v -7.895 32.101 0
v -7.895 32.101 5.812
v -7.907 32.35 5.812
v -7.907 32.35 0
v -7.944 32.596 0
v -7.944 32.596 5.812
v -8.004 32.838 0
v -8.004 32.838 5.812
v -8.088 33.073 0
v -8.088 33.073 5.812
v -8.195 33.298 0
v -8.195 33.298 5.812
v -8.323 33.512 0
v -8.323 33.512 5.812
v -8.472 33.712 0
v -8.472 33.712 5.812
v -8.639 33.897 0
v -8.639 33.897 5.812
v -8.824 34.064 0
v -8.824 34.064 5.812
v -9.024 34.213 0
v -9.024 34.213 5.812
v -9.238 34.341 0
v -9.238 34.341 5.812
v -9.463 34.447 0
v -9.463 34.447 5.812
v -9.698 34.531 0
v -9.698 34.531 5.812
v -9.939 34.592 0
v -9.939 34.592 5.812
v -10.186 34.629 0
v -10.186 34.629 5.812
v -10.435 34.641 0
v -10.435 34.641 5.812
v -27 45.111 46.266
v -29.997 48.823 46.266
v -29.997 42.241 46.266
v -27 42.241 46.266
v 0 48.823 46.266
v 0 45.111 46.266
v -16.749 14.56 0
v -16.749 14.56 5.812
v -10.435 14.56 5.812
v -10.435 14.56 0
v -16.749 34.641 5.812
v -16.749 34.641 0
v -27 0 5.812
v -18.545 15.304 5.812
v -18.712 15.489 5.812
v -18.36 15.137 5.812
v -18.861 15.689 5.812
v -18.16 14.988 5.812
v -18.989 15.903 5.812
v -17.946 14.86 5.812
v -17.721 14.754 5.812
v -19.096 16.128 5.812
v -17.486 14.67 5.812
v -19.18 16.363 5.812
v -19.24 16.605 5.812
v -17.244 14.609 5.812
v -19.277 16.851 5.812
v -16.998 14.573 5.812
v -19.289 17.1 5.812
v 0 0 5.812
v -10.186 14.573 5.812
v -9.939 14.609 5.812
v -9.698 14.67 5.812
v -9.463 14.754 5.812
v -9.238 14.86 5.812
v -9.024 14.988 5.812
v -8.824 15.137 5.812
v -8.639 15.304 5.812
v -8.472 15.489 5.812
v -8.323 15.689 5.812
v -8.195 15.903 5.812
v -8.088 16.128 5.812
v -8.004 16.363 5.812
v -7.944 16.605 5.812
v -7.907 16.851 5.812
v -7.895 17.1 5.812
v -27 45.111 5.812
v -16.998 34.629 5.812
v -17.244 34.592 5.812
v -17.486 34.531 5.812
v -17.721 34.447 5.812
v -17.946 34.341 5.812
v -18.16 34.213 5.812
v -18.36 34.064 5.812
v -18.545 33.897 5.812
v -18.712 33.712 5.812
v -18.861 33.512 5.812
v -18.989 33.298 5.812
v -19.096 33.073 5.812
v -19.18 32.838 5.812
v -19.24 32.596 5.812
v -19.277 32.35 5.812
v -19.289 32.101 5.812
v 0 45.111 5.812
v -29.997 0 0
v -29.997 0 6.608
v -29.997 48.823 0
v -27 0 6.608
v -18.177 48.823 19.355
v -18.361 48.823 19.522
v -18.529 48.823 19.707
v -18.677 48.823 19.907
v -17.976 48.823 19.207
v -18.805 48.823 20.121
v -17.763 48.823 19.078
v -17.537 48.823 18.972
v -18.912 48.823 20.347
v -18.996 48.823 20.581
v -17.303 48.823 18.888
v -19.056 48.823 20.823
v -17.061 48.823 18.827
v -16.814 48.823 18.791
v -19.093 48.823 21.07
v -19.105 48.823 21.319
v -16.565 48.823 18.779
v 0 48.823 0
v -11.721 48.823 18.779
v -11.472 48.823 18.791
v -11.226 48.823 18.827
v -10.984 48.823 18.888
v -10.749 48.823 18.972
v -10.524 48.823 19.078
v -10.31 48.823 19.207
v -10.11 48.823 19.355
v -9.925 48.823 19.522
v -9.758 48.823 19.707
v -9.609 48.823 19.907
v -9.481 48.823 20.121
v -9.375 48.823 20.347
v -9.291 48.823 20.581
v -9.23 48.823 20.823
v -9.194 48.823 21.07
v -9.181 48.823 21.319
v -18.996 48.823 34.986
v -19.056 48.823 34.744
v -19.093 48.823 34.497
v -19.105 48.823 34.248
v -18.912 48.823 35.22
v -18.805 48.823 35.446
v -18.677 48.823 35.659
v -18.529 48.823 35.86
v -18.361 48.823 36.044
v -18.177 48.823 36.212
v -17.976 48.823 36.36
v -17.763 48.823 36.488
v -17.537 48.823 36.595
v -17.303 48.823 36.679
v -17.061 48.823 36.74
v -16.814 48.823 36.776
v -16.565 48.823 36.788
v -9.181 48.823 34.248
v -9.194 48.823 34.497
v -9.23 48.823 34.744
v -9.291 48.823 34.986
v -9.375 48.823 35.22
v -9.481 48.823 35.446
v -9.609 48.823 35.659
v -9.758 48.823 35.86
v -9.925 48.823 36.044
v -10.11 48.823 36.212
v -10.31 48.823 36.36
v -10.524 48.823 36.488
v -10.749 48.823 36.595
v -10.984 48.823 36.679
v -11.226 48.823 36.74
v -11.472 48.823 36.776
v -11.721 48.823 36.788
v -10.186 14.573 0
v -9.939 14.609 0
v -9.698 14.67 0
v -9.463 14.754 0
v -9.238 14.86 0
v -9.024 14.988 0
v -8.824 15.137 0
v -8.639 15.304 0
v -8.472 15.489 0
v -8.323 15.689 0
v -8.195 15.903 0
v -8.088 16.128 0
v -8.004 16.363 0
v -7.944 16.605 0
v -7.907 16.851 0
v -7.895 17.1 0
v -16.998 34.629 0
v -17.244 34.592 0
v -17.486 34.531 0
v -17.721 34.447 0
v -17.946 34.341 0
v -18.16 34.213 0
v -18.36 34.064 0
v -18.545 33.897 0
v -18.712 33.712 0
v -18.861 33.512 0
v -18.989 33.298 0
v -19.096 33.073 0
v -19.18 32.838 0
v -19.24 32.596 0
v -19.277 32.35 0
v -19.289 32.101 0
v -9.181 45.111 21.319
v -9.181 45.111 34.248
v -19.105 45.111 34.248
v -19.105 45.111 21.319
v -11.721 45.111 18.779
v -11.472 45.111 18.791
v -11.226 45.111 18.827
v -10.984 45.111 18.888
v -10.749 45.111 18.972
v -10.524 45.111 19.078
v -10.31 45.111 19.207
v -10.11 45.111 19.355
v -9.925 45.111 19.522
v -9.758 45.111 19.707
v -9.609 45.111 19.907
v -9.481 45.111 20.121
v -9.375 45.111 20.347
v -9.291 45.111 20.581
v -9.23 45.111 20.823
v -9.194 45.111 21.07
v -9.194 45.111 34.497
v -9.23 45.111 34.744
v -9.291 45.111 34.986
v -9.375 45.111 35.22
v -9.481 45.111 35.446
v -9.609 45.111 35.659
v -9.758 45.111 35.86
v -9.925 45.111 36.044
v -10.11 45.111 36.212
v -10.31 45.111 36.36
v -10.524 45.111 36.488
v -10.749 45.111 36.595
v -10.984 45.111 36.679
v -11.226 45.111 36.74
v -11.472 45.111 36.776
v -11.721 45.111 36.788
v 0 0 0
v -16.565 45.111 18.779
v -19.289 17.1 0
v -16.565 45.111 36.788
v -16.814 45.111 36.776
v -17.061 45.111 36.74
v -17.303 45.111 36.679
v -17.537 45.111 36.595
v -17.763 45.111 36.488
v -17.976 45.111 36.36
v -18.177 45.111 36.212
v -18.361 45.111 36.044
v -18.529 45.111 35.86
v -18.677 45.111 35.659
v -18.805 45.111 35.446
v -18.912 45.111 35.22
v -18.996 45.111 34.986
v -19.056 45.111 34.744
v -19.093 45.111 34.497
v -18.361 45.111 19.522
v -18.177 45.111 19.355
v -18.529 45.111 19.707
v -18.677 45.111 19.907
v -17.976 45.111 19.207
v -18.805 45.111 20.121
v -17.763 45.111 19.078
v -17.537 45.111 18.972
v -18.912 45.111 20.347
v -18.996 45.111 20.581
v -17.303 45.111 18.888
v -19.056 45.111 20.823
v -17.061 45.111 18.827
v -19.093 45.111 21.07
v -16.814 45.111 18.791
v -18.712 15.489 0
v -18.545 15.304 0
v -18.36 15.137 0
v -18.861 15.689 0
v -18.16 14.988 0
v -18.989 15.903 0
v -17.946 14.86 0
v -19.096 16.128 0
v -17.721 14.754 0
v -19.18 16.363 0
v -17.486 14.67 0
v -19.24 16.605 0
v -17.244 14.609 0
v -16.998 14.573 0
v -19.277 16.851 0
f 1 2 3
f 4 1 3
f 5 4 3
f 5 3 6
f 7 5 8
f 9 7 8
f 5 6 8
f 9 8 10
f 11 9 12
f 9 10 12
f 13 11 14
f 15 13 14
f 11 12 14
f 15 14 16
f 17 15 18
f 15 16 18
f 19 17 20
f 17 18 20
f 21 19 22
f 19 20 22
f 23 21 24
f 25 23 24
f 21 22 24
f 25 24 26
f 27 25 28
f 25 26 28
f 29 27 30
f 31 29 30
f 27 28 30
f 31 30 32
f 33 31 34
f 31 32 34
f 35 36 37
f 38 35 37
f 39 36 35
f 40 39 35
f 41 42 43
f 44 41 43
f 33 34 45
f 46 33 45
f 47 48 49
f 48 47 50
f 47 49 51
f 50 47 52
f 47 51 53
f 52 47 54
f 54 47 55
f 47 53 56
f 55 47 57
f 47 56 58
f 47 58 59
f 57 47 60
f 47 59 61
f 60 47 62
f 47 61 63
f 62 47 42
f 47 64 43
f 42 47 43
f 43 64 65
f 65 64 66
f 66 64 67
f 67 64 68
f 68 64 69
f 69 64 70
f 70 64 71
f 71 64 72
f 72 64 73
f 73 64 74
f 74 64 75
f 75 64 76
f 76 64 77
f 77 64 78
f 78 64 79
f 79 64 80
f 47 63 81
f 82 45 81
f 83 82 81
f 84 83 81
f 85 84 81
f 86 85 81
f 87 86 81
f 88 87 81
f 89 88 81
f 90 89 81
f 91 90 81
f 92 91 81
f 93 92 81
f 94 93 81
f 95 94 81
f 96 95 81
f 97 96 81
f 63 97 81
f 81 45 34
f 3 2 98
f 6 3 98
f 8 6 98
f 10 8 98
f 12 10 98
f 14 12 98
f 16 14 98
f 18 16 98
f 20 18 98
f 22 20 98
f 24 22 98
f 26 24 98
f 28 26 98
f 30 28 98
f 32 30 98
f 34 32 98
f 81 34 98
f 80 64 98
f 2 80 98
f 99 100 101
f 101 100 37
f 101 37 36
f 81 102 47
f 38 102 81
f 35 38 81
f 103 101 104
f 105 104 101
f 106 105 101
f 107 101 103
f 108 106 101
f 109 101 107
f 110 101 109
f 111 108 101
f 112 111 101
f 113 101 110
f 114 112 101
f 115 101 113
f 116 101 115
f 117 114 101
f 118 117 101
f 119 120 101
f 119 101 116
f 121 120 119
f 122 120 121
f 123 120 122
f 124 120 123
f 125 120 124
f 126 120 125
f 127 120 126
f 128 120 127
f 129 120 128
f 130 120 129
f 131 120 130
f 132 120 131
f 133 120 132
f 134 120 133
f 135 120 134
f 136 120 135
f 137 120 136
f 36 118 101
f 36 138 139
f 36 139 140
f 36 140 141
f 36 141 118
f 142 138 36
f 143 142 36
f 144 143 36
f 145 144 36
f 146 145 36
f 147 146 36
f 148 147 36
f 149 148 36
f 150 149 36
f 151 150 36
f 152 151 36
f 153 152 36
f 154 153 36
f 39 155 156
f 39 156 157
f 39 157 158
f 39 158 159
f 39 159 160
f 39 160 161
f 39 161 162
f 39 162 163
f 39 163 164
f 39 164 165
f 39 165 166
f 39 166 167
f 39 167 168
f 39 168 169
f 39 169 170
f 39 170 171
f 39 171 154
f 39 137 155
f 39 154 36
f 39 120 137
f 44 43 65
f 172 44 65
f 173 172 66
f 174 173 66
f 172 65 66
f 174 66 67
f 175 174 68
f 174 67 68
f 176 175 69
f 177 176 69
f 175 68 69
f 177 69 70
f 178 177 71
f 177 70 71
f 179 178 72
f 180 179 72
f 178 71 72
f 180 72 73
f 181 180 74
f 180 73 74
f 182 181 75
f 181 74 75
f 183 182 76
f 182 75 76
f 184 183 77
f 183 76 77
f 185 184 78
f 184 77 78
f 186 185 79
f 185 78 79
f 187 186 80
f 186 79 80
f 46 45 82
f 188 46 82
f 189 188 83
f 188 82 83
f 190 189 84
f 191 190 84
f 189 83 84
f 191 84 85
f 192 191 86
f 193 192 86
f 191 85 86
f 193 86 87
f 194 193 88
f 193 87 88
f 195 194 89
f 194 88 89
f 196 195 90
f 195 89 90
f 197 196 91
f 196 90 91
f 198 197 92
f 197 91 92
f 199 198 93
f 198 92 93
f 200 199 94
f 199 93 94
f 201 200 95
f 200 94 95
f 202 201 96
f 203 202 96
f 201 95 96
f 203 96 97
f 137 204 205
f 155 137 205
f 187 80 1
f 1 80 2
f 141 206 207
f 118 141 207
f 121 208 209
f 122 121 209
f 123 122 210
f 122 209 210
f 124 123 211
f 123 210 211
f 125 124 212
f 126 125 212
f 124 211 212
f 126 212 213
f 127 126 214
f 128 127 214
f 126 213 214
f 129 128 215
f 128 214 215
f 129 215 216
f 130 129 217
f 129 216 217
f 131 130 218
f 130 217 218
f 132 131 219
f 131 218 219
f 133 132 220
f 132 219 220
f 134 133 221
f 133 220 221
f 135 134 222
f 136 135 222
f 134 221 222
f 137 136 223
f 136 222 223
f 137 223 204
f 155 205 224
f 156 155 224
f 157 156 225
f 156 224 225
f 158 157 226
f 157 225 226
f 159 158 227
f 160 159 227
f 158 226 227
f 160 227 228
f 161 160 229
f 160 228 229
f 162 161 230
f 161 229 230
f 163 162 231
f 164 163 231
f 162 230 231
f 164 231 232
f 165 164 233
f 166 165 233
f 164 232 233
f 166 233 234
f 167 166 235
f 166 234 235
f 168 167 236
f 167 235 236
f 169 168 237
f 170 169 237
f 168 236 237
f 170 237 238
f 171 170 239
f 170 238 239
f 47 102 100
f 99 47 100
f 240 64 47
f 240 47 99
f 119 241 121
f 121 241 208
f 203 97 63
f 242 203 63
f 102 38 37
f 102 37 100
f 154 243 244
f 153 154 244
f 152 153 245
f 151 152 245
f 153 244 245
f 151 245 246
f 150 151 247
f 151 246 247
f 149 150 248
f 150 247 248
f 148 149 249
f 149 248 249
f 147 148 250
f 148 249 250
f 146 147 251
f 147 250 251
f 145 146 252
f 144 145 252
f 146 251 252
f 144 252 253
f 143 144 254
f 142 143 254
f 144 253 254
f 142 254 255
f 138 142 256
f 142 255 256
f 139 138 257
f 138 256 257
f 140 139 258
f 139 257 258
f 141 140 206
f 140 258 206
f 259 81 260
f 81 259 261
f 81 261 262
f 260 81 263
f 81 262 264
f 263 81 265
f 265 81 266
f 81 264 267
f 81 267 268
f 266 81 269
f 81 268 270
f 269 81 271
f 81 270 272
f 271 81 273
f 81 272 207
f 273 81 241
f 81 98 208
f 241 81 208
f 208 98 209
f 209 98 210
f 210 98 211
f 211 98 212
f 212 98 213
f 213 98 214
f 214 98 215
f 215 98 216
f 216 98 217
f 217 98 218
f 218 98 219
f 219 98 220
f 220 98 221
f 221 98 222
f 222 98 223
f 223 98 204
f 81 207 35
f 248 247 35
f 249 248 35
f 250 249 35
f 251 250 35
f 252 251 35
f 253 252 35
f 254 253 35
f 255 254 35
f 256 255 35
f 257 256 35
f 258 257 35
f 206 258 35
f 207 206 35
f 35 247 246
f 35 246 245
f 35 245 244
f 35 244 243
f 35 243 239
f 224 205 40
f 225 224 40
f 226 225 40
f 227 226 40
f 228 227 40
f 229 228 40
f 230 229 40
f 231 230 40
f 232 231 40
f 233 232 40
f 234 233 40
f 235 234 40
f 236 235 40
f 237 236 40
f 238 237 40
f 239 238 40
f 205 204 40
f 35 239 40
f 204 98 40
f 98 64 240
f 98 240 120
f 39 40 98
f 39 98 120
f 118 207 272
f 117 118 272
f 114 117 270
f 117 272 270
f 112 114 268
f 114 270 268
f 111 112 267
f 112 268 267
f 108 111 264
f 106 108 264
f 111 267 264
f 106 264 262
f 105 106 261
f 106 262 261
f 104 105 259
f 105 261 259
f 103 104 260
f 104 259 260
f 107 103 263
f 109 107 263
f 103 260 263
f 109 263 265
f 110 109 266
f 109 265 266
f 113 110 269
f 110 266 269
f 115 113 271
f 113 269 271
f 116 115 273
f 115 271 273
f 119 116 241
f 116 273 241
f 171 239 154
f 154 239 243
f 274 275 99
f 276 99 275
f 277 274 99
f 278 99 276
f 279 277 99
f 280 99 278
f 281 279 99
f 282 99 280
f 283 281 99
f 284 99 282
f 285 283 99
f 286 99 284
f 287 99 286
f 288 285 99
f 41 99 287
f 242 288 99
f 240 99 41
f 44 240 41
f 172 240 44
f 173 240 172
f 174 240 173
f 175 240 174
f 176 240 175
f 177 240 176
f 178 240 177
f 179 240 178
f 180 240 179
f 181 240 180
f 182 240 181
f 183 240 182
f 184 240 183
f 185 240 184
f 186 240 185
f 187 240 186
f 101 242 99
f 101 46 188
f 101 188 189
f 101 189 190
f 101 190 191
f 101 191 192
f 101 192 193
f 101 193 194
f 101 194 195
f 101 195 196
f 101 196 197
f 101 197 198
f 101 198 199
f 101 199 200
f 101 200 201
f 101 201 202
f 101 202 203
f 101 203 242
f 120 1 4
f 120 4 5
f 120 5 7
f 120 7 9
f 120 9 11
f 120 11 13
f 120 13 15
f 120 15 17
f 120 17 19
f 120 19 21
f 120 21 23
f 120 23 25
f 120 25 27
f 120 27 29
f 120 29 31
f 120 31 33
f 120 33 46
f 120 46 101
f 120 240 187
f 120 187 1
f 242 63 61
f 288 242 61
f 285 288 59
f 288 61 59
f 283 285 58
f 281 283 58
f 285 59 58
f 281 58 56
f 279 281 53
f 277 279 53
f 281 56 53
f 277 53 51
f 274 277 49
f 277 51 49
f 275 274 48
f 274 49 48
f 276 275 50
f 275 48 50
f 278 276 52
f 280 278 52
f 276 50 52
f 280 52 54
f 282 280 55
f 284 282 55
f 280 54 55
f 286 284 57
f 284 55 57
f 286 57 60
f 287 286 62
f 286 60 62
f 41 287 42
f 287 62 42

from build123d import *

# Parameters (mm, degrees)
F1_DEPTH = 29.9974
F3_DEPTH = 27.0002
F6_DEPTH = 5.811617
F8_DEPTH = 3.712296


with BuildPart() as f1:
    # F0 (on Right) → F1 (new body)
    with BuildSketch(Plane.YZ):
        Polygon((0, 6.607804), (0, 0), (48.823252, 0), (48.823252, 46.265662), (42.241033, 46.265662), align=None)
    extrude(amount=-F1_DEPTH)


with BuildPart() as f3:
    # F2 (on Right) → F3 (new body)
    with BuildSketch(Plane.YZ):
        Polygon((45.110956, 5.811617), (45.110956, 61.896294), (-13.766318, 5.811617), align=None)
    extrude(amount=-F3_DEPTH)


with BuildPart() as f1_1:
    add(f1.part)

    # F4: cut F3
    add(f3.part, mode=Mode.SUBTRACT)

    # F5 (on face) → F6 (cut, through all)
    with BuildSketch(Plane.XY.offset(5.811617)):
        with BuildLine():
            Line((-10.435018, 34.640817), (-16.748959, 34.640817))
            ThreePointArc((-16.748959, 34.640817), (-18.54501, 33.896868), (-19.288959, 32.100817))
            Line((-19.288959, 32.100817), (-19.288959, 17.100303))
            ThreePointArc((-19.288959, 17.100303), (-18.54501, 15.304251), (-16.748959, 14.560303))
            Line((-16.748959, 14.560303), (-10.435018, 14.560303))
            ThreePointArc((-10.435018, 14.560303), (-8.638967, 15.304251), (-7.895018, 17.100303))
            Line((-7.895018, 17.100303), (-7.895018, 32.100817))
            ThreePointArc((-7.895018, 32.100817), (-8.638967, 33.896868), (-10.435018, 34.640817))
        make_face()
    extrude(amount=-F6_DEPTH, mode=Mode.SUBTRACT)

    # F7 (on face) → F8 (cut, through all)
    with BuildSketch(Plane.XZ.offset(-45.110956)):
        with BuildLine():
            Line((-11.721431, 36.788322), (-16.565181, 36.788322))
            ThreePointArc((-16.565181, 36.788322), (-18.361232, 36.044373), (-19.105181, 34.248322))
            Line((-19.105181, 34.248322), (-19.105181, 21.318551))
            ThreePointArc((-19.105181, 21.318551), (-18.361232, 19.5225), (-16.565181, 18.778551))
            Line((-16.565181, 18.778551), (-11.721431, 18.778551))
            ThreePointArc((-11.721431, 18.778551), (-9.925379, 19.5225), (-9.181431, 21.318551))
            Line((-9.181431, 21.318551), (-9.181431, 34.248322))
            ThreePointArc((-9.181431, 34.248322), (-9.925379, 36.044373), (-11.721431, 36.788322))
        make_face()
    extrude(amount=-F8_DEPTH, mode=Mode.SUBTRACT)


solid = f1_1.part
